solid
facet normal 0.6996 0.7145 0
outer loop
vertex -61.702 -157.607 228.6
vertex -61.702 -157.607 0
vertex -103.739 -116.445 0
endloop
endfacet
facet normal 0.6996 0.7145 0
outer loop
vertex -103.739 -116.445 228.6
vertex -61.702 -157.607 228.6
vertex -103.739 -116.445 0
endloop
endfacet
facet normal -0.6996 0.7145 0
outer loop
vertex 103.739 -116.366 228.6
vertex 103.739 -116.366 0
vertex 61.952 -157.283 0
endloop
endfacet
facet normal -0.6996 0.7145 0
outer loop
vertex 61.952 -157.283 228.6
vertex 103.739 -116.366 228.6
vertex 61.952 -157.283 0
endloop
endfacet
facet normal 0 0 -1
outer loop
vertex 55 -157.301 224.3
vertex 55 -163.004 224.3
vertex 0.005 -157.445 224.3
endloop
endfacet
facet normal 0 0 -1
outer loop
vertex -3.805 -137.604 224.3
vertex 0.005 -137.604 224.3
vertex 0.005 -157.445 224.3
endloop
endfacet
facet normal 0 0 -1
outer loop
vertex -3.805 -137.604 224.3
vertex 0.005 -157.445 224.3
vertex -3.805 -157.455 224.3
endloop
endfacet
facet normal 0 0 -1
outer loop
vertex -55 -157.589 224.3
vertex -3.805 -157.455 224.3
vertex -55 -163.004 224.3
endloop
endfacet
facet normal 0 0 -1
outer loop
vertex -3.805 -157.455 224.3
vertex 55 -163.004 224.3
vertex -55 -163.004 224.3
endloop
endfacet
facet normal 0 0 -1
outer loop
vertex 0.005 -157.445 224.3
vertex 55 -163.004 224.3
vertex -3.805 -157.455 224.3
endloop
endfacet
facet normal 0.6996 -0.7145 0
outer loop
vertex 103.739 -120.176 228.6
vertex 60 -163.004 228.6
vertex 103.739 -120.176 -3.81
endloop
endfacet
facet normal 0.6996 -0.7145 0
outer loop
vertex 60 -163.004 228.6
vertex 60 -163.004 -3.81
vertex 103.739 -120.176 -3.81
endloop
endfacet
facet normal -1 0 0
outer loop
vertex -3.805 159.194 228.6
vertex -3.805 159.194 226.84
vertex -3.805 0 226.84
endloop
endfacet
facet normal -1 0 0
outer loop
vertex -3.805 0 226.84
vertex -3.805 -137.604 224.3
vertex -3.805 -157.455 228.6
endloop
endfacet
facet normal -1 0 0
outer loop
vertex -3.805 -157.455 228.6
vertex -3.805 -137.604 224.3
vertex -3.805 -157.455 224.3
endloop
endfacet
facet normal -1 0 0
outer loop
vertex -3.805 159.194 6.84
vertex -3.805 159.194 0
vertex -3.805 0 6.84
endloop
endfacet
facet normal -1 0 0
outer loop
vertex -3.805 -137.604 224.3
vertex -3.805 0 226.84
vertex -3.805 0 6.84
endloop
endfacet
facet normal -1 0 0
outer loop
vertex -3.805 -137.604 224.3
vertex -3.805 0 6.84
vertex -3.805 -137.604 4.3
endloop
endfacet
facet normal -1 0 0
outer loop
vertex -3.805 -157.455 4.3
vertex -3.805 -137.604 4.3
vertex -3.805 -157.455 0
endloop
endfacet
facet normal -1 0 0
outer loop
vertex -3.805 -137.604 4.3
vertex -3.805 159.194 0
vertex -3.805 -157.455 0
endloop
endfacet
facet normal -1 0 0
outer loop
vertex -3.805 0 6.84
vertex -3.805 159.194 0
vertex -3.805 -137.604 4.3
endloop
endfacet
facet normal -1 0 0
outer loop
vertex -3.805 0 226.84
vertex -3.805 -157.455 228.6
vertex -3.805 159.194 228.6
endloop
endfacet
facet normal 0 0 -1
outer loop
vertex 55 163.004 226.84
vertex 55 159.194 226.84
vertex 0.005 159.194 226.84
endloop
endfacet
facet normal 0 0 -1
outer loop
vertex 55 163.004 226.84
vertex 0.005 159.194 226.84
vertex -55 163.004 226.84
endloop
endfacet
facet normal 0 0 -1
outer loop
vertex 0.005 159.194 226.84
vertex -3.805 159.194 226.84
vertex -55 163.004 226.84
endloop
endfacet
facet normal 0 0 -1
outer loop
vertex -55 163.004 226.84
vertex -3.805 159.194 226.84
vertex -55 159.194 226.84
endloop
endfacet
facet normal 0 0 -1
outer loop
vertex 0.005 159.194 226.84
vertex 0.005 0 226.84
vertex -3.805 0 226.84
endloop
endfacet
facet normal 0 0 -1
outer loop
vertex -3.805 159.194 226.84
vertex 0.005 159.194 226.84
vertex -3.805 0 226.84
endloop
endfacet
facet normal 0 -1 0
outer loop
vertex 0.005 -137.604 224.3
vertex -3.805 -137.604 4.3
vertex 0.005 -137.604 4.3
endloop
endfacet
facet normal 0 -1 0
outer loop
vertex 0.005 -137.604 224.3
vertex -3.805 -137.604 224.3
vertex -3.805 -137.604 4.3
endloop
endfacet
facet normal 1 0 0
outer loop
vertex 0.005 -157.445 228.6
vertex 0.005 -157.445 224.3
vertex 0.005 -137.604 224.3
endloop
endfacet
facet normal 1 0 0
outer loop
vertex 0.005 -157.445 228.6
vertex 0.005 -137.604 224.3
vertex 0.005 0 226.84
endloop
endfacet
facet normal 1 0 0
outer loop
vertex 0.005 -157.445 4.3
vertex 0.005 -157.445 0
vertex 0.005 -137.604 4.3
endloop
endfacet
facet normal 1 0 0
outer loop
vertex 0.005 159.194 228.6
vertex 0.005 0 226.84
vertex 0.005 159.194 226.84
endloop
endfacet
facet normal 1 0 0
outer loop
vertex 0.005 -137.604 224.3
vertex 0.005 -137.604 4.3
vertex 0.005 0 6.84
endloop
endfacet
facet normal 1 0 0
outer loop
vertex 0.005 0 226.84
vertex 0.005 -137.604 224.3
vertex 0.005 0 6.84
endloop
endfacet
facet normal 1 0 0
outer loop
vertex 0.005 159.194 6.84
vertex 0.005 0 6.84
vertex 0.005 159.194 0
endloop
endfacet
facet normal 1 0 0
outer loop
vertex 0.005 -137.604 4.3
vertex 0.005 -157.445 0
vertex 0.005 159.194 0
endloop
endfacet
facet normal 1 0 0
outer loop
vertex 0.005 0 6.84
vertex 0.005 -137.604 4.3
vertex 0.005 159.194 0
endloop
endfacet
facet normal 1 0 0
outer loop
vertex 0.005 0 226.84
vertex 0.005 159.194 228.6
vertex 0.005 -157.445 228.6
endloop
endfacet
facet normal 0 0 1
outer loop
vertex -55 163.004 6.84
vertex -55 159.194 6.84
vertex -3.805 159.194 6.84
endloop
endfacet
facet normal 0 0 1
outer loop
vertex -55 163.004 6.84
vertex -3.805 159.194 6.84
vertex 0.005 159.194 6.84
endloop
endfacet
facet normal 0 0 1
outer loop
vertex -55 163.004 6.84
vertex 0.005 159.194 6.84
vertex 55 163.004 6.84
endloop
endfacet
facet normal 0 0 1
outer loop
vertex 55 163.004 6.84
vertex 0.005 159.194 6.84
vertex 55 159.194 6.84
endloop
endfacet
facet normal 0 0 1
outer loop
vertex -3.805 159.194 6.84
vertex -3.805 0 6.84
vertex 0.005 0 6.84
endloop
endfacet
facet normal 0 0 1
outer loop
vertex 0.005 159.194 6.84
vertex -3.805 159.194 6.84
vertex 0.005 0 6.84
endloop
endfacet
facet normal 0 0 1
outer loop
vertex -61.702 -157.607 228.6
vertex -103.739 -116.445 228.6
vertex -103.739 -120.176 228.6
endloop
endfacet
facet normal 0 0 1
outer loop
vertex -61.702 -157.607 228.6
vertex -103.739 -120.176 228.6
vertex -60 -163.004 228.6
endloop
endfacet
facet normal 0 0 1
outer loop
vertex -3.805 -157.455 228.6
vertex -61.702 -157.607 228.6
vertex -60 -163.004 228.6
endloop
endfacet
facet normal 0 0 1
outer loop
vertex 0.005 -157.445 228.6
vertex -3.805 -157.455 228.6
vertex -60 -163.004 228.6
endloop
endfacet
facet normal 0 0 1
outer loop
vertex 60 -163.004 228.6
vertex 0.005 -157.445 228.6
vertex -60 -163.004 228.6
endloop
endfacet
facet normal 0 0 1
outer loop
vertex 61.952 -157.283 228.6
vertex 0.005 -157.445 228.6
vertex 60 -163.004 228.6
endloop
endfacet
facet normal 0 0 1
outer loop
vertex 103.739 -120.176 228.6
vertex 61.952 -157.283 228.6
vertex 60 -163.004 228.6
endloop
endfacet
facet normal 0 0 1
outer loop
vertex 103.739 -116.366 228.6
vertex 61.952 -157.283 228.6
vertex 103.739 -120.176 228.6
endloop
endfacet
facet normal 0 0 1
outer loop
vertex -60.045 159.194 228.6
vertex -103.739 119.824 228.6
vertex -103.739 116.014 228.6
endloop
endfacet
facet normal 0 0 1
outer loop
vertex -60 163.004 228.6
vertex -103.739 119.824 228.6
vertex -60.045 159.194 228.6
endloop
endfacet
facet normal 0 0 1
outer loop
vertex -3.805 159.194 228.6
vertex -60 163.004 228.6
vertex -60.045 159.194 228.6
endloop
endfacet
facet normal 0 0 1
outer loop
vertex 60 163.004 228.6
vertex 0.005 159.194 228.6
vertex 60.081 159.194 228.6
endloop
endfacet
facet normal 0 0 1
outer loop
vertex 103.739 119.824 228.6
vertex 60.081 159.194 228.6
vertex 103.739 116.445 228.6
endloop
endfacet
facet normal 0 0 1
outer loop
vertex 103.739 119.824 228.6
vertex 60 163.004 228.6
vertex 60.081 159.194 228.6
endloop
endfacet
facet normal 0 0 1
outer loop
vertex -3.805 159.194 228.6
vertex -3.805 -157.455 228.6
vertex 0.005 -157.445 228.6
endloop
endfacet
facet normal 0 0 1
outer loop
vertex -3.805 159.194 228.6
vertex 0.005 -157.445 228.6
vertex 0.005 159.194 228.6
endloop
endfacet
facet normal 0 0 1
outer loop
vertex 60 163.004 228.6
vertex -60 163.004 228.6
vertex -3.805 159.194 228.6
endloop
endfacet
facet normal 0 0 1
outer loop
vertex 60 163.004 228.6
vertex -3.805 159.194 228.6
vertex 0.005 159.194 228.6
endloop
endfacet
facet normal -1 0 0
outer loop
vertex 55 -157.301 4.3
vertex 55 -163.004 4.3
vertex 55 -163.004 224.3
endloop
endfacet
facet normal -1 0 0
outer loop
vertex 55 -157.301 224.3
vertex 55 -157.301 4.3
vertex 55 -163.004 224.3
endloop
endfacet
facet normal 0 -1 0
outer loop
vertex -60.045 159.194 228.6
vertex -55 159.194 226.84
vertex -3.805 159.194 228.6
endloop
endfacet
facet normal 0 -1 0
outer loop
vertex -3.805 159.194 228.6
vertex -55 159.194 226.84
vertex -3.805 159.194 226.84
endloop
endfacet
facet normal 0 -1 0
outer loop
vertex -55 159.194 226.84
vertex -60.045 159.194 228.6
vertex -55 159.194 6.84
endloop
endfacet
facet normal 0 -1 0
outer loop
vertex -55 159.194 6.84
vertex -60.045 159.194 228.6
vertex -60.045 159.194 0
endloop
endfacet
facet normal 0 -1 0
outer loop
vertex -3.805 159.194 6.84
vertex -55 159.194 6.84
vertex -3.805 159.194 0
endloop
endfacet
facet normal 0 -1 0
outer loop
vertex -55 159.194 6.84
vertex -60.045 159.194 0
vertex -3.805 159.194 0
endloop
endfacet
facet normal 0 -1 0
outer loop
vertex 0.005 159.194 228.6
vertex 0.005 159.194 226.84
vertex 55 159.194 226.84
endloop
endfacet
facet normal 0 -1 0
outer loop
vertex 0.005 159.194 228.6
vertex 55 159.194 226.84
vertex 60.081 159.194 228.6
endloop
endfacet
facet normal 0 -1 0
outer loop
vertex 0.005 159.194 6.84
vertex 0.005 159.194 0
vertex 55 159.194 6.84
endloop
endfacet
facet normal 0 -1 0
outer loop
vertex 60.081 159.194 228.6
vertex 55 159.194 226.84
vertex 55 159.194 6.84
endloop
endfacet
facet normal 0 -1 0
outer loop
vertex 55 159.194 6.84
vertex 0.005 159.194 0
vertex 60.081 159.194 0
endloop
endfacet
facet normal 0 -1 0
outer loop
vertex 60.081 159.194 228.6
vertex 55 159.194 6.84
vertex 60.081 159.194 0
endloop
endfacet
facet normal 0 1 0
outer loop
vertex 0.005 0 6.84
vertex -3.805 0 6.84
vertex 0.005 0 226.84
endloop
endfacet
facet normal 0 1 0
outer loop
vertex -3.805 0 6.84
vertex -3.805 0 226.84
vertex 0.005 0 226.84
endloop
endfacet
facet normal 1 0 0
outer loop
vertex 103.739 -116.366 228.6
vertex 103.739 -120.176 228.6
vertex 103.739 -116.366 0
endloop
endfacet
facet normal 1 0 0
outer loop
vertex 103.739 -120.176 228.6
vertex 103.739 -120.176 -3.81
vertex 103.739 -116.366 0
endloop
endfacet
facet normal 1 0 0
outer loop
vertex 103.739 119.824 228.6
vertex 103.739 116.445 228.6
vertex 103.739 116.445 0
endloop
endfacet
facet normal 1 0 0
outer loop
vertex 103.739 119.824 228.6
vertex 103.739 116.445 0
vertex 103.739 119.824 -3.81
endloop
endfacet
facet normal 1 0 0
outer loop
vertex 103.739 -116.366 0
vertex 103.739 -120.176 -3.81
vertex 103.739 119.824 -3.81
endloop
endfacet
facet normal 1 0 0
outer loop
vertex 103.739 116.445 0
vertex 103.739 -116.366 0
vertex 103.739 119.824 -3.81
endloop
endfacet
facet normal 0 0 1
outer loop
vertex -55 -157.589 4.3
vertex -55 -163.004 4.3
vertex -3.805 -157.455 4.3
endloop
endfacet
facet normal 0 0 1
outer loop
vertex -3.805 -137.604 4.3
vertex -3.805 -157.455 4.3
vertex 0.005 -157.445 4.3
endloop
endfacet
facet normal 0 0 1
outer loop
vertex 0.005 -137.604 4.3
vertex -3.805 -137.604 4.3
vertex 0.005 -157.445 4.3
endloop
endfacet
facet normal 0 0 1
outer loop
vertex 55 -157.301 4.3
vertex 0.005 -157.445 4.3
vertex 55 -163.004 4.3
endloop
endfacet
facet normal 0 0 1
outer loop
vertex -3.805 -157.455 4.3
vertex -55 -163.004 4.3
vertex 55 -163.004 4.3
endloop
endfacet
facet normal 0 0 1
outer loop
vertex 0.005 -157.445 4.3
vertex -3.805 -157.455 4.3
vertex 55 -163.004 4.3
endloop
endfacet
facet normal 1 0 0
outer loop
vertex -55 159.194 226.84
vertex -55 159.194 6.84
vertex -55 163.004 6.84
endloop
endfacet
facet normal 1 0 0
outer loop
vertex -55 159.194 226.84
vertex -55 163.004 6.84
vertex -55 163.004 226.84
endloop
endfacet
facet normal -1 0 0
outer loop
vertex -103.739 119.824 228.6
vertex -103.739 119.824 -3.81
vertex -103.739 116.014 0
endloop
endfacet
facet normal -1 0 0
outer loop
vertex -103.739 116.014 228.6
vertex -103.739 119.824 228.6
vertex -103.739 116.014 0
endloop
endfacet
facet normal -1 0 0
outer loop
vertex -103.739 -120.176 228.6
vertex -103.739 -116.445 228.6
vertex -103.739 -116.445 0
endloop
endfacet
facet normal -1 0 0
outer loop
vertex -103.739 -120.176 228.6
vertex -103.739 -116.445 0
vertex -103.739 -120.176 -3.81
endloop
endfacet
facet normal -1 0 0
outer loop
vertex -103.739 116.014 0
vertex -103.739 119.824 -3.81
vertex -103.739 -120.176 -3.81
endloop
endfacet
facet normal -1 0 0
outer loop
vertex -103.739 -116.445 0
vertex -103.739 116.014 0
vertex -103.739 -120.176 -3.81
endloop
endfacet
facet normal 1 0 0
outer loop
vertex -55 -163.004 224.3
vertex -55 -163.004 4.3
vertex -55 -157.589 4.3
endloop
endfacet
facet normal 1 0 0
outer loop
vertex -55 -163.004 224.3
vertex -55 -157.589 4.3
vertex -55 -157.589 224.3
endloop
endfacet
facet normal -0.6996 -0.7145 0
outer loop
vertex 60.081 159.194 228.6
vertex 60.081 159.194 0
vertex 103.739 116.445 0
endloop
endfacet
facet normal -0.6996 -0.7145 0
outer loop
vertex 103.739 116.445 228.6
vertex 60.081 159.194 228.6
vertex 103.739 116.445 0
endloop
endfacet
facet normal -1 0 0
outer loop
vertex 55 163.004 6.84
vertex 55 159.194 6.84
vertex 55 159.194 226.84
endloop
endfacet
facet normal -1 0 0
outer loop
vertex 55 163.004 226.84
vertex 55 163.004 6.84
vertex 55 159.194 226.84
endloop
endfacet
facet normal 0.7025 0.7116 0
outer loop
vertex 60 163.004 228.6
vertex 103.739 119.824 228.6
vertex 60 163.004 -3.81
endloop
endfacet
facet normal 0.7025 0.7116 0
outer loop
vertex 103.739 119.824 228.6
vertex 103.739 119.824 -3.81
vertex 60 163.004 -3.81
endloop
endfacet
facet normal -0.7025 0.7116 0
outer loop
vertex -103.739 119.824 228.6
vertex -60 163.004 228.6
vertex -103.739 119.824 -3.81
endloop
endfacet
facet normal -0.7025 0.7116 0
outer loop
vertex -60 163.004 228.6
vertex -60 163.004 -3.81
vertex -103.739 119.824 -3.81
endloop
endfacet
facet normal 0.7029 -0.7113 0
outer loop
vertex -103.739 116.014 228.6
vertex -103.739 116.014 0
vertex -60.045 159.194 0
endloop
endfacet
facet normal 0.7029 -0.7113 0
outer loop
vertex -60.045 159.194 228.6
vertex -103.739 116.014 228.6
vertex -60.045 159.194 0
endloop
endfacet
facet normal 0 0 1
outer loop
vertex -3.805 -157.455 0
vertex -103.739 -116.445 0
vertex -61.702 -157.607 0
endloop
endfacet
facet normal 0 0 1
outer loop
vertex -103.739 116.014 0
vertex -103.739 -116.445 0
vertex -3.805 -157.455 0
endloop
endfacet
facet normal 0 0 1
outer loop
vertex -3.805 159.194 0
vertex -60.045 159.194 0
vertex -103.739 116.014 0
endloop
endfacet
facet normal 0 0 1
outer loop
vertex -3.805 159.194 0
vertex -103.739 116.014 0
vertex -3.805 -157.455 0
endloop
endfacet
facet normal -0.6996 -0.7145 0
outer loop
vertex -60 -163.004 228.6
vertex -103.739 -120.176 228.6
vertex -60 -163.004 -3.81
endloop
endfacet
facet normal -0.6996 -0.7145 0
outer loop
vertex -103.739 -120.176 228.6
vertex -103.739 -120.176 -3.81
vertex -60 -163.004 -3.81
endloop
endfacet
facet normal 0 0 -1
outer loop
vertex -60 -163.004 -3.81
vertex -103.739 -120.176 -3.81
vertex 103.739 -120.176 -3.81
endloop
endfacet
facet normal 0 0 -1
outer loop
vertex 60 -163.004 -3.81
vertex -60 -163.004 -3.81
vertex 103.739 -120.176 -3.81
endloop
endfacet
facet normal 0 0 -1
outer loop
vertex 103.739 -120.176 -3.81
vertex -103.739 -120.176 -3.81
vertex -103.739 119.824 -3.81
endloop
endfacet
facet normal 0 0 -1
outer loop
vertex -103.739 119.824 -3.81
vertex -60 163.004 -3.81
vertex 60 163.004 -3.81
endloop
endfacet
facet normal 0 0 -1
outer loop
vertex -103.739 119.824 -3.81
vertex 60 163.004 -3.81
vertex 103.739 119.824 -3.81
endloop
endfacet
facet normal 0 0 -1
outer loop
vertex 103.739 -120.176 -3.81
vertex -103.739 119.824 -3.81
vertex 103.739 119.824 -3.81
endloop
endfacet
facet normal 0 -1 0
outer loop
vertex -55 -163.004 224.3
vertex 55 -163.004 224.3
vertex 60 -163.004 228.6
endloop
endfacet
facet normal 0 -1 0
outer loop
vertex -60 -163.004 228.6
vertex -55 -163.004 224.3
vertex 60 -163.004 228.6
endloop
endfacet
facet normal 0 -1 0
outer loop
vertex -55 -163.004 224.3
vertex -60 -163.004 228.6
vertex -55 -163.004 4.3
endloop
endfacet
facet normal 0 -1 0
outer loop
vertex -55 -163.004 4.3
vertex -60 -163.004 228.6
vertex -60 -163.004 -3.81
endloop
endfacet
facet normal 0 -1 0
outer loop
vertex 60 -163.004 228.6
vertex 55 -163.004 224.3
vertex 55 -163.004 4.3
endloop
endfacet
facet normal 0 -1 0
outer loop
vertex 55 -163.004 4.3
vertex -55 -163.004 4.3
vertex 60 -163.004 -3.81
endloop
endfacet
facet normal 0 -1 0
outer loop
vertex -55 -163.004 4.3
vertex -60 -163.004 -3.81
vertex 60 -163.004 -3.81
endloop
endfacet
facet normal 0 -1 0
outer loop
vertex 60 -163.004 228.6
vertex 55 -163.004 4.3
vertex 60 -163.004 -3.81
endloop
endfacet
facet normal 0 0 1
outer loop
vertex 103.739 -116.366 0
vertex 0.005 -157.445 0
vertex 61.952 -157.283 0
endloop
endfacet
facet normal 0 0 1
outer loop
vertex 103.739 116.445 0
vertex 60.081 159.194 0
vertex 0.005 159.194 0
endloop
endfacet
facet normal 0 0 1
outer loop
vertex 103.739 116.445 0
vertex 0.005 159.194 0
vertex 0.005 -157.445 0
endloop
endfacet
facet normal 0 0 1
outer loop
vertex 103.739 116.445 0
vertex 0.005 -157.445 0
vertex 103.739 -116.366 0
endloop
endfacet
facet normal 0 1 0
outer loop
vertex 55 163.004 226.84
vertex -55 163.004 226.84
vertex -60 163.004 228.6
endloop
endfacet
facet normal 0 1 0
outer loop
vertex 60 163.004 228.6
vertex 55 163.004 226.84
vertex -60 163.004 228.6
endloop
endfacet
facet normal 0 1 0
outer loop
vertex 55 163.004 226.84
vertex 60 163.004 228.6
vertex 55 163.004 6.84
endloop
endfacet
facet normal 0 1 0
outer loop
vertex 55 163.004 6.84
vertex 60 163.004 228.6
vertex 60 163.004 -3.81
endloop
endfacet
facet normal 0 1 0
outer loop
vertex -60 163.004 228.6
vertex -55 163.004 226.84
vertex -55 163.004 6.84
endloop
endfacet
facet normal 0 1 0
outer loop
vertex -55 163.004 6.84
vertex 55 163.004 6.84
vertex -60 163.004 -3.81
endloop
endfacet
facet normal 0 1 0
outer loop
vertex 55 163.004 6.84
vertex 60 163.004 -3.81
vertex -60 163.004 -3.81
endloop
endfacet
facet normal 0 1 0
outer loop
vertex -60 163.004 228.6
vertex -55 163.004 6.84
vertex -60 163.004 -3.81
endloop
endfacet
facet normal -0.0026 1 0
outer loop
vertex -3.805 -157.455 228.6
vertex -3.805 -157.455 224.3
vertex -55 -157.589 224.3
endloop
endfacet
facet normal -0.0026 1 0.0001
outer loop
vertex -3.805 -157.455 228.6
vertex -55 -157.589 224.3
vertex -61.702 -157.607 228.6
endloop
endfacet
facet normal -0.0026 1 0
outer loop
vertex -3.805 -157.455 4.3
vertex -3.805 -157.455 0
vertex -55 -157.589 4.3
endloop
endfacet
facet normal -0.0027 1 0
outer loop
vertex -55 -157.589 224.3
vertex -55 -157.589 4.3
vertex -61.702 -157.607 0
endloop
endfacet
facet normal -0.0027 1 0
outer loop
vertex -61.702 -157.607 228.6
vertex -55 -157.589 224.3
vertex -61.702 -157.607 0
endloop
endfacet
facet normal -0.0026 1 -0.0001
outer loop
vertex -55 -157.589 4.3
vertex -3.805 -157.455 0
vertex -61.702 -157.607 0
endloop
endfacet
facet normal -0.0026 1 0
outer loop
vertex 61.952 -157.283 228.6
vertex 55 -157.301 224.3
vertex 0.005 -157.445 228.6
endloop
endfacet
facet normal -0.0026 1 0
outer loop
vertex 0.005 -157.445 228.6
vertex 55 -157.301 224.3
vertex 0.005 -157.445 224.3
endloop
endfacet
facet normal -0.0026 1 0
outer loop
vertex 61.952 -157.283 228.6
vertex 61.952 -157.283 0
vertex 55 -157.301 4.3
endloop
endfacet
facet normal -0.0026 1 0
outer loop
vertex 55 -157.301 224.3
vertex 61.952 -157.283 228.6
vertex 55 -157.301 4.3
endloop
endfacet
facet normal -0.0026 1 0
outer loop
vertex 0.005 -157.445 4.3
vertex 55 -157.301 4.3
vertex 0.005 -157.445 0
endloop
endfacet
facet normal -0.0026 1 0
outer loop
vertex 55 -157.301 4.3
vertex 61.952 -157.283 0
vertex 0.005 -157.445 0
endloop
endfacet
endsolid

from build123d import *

# Parameters (mm, degrees)
F1_DEPTH = 3.81
F2_DEPTH = 228.6
F3_W     = 55
F3_H     = 220
F4_DEPTH = 25.4
F5_W     = 55
F5_H     = 220
F7_DEPTH = 228.6


with BuildPart() as f1:
    # F0 (on Top) → F1 (new body)
    with BuildSketch(Plane.XY):
        Polygon((-60.0453081081, 159.1941417708), (-56.19, 163.0041417708), (-60, 163.0041417708), (-103.7388, 119.8241417708), (-103.7388, 116.0141417708), align=None)
        Polygon((60.0809994569, 159.1941417708), (56.19, 163.0041417708), (-56.19, 163.0041417708), (-60.0453081081, 159.1941417708), (-3.8048, 159.1941417708), (0.0052, 159.1941417708), align=None)
        Polygon((-3.8048, 159.1941417708), (-60.0453081081, 159.1941417708), (-103.7388, 116.0141417708), (-103.7388, -116.4451715096), (-61.7023795136, -157.6065141999), (-3.8048, -157.4549383449), align=None)
        Polygon((0.0052, -157.4449637654), (0.0052, 159.1941417708), (-3.8048, 159.1941417708), (-3.8048, -157.4549383449), align=None)
        Polygon((103.7388, -116.3658582292), (103.7388, 116.4451715096), (60.0809994569, 159.1941417708), (0.0052, 159.1941417708), (0.0052, -157.4449637654), (61.9519895189, -157.2827870792), align=None)
        Polygon((103.7388, 119.8241417708), (60, 163.0041417708), (56.19, 163.0041417708), (60.0809994569, 159.1941417708), (103.7388, 116.4451715096), align=None)
        Polygon((103.7388, -120.1758582292), (103.7388, -116.3658582292), (61.9519895189, -157.2827870792), (56.1090005431, -163.0041417708), (60, -163.0041417708), align=None)
        Polygon((56.1090005431, -163.0041417708), (61.9519895189, -157.2827870792), (0.0052, -157.4449637654), (-3.8048, -157.4549383449), (-61.7023795136, -157.6065141999), (-56.19, -163.0041417708), align=None)
        Polygon((-61.7023795136, -157.6065141999), (-103.7388, -116.4451715096), (-103.7388, -120.1758582292), (-60, -163.0041417708), (-56.19, -163.0041417708), align=None)
    extrude(amount=-F1_DEPTH)

    # F0 (on Top) → F2 (join)
    with BuildSketch(Plane.XY):
        Polygon((60.0809994569, 159.1941417708), (56.19, 163.0041417708), (-56.19, 163.0041417708), (-60.0453081081, 159.1941417708), (-3.8048, 159.1941417708), (0.0052, 159.1941417708), align=None)
        Polygon((103.7388, 119.8241417708), (60, 163.0041417708), (56.19, 163.0041417708), (60.0809994569, 159.1941417708), (103.7388, 116.4451715096), align=None)
        Polygon((-60.0453081081, 159.1941417708), (-56.19, 163.0041417708), (-60, 163.0041417708), (-103.7388, 119.8241417708), (-103.7388, 116.0141417708), align=None)
        Polygon((56.1090005431, -163.0041417708), (61.9519895189, -157.2827870792), (0.0052, -157.4449637654), (-3.8048, -157.4549383449), (-61.7023795136, -157.6065141999), (-56.19, -163.0041417708), align=None)
        Polygon((-61.7023795136, -157.6065141999), (-103.7388, -116.4451715096), (-103.7388, -120.1758582292), (-60, -163.0041417708), (-56.19, -163.0041417708), align=None)
        Polygon((103.7388, -120.1758582292), (103.7388, -116.3658582292), (61.9519895189, -157.2827870792), (56.1090005431, -163.0041417708), (60, -163.0041417708), align=None)
        Polygon((0.0052, -157.4449637654), (0.0052, 159.1941417708), (-3.8048, 159.1941417708), (-3.8048, -157.4549383449), align=None)
    extrude(amount=F2_DEPTH)

    # F3 (on face) → F4 (cut)
    with BuildSketch(Plane.XZ.offset(163.0041417708)):
        with Locations((27.5, 114.3)):
            Rectangle(F3_W, F3_H)
        with Locations((-27.5, 114.3)):
            Rectangle(F3_W, F3_H)
    extrude(amount=-F4_DEPTH, mode=Mode.SUBTRACT)

    # F5 (on Front) → F7 (cut)
    with BuildSketch(Plane.XZ):
        with Locations((27.5, 116.84)):
            Rectangle(F5_W, F5_H)
        with Locations((-27.5, 116.84)):
            Rectangle(F5_W, F5_H)
    extrude(amount=-F7_DEPTH, mode=Mode.SUBTRACT)


solid = f1.part
